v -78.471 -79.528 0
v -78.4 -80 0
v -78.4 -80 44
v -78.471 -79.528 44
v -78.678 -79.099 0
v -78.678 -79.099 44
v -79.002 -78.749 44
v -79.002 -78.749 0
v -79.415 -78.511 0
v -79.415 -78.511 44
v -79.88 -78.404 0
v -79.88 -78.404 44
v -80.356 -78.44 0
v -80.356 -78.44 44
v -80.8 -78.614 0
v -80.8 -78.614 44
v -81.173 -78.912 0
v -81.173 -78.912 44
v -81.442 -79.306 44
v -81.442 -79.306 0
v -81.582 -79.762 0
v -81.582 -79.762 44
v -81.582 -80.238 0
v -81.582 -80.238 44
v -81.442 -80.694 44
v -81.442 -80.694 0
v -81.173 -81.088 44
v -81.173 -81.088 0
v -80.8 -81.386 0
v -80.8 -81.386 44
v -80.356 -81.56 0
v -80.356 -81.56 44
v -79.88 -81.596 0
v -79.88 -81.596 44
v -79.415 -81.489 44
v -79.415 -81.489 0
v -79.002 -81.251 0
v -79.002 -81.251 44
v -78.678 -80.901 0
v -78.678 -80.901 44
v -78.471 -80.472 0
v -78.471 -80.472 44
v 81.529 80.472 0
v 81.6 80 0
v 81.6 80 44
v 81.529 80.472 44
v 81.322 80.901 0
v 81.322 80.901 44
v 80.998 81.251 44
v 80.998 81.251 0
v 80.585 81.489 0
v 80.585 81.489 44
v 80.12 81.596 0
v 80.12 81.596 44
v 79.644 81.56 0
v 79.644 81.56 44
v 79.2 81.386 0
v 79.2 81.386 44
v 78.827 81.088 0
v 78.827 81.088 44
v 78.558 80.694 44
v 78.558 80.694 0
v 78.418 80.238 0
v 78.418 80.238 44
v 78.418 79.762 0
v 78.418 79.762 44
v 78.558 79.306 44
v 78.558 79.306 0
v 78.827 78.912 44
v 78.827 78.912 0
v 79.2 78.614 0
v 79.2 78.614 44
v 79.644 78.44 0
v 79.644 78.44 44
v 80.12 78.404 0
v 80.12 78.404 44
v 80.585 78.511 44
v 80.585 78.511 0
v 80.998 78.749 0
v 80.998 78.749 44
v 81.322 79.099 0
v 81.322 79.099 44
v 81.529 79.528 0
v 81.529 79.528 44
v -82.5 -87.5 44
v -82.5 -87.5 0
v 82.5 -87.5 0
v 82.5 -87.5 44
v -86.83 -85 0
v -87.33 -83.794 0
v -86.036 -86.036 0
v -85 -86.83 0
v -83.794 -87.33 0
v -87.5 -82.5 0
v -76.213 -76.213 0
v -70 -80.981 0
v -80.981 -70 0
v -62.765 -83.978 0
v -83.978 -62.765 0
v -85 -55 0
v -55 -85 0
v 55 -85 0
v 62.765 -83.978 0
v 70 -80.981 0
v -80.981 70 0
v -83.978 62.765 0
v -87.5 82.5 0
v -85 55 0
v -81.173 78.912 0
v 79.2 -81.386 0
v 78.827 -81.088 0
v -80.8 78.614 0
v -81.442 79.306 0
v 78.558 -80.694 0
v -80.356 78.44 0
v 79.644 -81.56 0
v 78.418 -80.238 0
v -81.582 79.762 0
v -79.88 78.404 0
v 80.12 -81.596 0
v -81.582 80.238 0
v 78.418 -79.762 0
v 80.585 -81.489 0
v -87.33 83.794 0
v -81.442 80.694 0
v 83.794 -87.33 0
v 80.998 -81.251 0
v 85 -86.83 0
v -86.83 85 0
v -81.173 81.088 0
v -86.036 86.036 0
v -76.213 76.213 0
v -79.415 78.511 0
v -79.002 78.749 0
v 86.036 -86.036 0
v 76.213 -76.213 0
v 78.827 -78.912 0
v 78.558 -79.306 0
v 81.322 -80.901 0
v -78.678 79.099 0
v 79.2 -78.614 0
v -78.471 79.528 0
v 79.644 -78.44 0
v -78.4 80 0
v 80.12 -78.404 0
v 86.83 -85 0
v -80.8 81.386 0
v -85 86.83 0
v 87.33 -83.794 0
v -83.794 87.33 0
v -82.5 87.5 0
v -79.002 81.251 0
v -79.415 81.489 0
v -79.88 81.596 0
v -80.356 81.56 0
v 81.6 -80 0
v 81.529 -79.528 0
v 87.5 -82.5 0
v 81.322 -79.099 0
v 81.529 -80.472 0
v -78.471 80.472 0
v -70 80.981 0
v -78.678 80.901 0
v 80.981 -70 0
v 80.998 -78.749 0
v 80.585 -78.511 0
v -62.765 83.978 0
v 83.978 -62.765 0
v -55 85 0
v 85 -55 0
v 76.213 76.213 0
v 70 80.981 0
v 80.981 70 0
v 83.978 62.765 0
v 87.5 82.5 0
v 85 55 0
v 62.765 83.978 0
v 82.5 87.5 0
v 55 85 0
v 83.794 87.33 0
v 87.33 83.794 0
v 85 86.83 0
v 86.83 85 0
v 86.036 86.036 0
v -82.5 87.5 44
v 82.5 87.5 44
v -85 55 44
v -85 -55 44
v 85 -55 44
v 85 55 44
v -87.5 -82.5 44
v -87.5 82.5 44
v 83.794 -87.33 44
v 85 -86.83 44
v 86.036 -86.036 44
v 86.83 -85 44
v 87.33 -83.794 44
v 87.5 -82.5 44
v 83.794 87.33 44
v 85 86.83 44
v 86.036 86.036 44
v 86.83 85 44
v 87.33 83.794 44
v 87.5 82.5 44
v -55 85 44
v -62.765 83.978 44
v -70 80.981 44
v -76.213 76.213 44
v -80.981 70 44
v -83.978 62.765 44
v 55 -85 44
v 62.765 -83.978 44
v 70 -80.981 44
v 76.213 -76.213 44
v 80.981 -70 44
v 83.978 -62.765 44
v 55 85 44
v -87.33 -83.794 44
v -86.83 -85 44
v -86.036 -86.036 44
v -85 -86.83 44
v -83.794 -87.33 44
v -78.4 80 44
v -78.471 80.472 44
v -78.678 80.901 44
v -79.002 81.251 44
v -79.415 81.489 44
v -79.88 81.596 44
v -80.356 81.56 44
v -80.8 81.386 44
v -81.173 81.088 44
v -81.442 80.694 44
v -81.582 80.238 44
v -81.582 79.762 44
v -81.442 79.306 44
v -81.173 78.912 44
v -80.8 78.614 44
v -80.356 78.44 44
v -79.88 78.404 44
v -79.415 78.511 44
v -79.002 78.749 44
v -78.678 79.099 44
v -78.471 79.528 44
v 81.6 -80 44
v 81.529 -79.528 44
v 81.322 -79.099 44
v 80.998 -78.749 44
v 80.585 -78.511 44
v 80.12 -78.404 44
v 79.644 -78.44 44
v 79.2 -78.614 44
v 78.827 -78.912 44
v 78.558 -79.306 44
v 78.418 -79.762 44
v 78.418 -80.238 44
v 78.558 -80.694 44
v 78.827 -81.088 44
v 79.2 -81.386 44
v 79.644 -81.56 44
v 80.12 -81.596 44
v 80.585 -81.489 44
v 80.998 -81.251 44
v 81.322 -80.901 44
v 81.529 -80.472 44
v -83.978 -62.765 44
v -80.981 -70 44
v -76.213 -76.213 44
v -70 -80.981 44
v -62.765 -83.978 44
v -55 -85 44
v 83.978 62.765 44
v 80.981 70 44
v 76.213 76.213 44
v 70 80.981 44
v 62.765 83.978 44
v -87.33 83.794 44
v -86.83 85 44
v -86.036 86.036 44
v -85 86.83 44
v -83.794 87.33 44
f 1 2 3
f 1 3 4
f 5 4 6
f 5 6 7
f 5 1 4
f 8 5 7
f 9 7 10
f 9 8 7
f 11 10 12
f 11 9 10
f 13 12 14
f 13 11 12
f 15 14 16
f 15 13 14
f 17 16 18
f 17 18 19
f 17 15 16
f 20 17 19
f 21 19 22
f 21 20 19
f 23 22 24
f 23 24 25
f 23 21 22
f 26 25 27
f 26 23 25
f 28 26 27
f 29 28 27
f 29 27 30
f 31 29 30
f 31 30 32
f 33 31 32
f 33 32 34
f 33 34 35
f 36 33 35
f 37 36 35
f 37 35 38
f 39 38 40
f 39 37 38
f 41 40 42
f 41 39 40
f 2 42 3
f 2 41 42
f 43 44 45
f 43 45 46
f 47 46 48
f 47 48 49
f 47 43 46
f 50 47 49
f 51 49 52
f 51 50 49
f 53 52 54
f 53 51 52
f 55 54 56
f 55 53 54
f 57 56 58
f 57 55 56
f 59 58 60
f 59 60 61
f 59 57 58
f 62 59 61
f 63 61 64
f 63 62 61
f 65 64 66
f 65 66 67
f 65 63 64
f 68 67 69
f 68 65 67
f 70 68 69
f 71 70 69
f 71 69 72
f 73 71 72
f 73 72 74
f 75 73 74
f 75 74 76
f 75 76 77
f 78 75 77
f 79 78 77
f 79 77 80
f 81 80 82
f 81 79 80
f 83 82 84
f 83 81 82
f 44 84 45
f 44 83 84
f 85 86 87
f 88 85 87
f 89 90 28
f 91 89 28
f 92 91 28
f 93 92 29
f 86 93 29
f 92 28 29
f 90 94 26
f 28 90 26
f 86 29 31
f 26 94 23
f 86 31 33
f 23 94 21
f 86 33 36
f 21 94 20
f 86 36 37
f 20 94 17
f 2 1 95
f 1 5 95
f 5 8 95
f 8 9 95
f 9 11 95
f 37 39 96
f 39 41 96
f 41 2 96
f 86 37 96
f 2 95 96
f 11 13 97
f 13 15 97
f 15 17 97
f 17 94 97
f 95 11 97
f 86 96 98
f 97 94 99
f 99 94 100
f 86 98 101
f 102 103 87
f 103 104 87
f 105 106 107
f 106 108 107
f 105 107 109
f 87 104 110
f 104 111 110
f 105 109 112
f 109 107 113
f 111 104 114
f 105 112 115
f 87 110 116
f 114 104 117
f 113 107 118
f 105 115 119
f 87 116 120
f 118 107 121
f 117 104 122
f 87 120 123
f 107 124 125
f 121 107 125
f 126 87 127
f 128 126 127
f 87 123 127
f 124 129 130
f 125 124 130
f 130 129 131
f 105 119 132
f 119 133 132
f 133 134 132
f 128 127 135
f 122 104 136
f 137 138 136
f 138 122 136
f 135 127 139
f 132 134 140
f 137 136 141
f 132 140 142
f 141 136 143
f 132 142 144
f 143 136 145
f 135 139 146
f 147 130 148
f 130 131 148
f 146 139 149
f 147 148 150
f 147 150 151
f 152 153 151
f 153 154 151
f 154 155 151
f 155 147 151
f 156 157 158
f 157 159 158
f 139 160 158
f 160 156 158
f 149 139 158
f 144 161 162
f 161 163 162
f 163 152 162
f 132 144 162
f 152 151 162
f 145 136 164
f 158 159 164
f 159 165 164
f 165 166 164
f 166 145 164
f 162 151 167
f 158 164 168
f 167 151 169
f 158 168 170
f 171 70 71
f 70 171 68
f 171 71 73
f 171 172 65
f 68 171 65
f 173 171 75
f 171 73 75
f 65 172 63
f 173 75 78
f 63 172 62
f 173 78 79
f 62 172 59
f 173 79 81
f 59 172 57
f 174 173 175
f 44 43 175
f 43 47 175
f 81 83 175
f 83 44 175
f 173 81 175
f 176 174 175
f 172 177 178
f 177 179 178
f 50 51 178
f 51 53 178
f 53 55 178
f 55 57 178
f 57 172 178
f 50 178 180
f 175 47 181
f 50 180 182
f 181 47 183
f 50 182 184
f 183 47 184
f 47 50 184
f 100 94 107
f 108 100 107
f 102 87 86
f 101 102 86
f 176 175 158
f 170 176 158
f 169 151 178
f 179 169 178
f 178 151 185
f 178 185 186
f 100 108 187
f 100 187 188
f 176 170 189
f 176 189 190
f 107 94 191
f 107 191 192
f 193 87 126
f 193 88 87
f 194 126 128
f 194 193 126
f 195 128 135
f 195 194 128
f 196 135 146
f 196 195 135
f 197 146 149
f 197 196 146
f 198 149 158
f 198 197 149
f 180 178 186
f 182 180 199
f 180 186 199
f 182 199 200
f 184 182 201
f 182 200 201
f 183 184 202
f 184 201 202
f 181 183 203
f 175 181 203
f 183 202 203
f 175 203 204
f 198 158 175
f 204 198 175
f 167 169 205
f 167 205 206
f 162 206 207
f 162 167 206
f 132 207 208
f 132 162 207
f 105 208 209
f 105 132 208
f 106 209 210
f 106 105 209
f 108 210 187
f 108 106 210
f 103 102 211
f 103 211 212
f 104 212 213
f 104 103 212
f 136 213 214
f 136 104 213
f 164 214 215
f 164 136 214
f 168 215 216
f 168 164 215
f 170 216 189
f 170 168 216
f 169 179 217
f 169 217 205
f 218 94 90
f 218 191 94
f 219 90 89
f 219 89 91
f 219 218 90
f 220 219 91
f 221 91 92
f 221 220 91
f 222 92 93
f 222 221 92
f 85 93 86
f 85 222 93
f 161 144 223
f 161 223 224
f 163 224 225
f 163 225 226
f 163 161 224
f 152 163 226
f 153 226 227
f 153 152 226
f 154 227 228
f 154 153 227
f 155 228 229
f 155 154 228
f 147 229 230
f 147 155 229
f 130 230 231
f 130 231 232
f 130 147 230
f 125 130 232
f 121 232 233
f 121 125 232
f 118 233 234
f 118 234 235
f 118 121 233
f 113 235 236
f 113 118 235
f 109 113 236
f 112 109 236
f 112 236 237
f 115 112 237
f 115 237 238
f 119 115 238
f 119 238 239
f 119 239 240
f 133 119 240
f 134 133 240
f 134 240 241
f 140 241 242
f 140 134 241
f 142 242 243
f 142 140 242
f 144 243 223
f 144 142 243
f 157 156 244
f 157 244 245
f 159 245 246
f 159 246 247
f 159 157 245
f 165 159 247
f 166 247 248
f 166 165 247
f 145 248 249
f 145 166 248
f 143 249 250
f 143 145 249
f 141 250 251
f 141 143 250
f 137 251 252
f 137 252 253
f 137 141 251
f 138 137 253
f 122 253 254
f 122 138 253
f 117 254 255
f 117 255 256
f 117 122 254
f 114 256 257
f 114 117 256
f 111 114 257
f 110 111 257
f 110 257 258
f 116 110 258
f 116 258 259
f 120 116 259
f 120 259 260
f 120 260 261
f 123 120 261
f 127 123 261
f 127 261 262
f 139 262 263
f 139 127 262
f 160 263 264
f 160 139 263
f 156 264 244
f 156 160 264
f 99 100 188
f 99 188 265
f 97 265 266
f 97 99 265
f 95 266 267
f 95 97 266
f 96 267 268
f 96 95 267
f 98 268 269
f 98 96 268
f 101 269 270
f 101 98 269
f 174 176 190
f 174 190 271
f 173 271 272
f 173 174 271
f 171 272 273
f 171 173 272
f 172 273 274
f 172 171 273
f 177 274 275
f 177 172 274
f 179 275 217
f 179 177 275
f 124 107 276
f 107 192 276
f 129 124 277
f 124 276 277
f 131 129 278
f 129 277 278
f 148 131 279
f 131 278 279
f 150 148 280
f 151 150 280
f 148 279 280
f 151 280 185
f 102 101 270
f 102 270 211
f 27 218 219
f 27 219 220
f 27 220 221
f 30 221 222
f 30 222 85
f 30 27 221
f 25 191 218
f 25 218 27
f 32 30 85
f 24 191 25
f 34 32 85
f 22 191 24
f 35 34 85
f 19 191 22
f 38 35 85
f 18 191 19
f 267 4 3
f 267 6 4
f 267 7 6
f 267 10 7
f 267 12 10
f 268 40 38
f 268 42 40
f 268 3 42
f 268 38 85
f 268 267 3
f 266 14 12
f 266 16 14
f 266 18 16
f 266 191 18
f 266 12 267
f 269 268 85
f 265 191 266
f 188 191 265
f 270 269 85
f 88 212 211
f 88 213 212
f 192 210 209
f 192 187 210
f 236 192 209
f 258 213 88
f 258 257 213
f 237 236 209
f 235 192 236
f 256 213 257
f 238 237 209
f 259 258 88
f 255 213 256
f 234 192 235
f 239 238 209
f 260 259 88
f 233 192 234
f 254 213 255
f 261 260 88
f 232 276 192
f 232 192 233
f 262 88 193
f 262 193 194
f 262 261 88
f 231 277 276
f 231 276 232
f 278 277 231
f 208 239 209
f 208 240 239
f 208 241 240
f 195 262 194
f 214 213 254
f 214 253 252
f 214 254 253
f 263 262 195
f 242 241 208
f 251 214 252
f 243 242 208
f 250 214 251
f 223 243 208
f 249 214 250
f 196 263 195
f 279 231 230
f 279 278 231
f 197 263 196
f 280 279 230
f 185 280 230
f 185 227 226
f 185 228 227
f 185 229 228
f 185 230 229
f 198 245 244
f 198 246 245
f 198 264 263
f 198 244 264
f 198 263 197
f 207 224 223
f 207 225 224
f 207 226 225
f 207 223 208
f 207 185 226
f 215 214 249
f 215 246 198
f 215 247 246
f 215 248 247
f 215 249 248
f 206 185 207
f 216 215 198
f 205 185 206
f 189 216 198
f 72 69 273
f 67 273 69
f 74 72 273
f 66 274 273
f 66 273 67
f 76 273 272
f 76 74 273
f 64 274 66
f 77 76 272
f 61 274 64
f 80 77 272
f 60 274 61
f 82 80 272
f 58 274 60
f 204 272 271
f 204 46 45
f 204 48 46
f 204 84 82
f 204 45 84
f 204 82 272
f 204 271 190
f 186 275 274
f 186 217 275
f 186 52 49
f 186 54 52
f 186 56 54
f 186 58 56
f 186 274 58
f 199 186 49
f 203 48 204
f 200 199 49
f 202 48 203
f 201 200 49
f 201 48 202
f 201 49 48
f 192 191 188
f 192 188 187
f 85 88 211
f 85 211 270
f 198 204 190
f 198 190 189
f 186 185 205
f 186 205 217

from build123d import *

# Parameters (mm, degrees)
SKETCH_W  = 175
SKETCH_H  = 175
SKETCH_R  = 1.6
PAD_DEPTH = 44
FILLET_R  = 5


with BuildPart() as part:
    # Sketch → Pad (new body)
    with BuildSketch(Plane.XY):
        Rectangle(SKETCH_W, SKETCH_H)
        with Locations((-80, 80)):
            Circle(SKETCH_R, mode=Mode.SUBTRACT)
        with Locations((80, 80)):
            Circle(SKETCH_R, mode=Mode.SUBTRACT)
        with Locations((80, -80)):
            Circle(SKETCH_R, mode=Mode.SUBTRACT)
        with Locations((-80, -80)):
            Circle(SKETCH_R, mode=Mode.SUBTRACT)
        with BuildLine():
            Line((-85, 55), (-85, -55))
            ThreePointArc((-85, -55), (-76.213203, -76.213203), (-55, -85))
            Line((-55, -85), (55, -85))
            ThreePointArc((55, -85), (76.213203, -76.213203), (85, -55))
            Line((85, -55), (85, 55))
            ThreePointArc((85, 55), (76.213203, 76.213203), (55, 85))
            Line((55, 85), (-55, 85))
            ThreePointArc((-55, 85), (-76.213203, 76.213203), (-85, 55))
        make_face(mode=Mode.SUBTRACT)
    extrude(amount=PAD_DEPTH)

    # Fillet
    fillet_edges = [part.edges().sort_by_distance(p)[0] for p in [
        (87.5, 87.5, 22),
        (87.5, -87.5, 22),
        (-87.5, -87.5, 22),
        (-87.5, 87.5, 22),
    ]]
    fillet(fillet_edges, radius=FILLET_R)


solid = part.part
